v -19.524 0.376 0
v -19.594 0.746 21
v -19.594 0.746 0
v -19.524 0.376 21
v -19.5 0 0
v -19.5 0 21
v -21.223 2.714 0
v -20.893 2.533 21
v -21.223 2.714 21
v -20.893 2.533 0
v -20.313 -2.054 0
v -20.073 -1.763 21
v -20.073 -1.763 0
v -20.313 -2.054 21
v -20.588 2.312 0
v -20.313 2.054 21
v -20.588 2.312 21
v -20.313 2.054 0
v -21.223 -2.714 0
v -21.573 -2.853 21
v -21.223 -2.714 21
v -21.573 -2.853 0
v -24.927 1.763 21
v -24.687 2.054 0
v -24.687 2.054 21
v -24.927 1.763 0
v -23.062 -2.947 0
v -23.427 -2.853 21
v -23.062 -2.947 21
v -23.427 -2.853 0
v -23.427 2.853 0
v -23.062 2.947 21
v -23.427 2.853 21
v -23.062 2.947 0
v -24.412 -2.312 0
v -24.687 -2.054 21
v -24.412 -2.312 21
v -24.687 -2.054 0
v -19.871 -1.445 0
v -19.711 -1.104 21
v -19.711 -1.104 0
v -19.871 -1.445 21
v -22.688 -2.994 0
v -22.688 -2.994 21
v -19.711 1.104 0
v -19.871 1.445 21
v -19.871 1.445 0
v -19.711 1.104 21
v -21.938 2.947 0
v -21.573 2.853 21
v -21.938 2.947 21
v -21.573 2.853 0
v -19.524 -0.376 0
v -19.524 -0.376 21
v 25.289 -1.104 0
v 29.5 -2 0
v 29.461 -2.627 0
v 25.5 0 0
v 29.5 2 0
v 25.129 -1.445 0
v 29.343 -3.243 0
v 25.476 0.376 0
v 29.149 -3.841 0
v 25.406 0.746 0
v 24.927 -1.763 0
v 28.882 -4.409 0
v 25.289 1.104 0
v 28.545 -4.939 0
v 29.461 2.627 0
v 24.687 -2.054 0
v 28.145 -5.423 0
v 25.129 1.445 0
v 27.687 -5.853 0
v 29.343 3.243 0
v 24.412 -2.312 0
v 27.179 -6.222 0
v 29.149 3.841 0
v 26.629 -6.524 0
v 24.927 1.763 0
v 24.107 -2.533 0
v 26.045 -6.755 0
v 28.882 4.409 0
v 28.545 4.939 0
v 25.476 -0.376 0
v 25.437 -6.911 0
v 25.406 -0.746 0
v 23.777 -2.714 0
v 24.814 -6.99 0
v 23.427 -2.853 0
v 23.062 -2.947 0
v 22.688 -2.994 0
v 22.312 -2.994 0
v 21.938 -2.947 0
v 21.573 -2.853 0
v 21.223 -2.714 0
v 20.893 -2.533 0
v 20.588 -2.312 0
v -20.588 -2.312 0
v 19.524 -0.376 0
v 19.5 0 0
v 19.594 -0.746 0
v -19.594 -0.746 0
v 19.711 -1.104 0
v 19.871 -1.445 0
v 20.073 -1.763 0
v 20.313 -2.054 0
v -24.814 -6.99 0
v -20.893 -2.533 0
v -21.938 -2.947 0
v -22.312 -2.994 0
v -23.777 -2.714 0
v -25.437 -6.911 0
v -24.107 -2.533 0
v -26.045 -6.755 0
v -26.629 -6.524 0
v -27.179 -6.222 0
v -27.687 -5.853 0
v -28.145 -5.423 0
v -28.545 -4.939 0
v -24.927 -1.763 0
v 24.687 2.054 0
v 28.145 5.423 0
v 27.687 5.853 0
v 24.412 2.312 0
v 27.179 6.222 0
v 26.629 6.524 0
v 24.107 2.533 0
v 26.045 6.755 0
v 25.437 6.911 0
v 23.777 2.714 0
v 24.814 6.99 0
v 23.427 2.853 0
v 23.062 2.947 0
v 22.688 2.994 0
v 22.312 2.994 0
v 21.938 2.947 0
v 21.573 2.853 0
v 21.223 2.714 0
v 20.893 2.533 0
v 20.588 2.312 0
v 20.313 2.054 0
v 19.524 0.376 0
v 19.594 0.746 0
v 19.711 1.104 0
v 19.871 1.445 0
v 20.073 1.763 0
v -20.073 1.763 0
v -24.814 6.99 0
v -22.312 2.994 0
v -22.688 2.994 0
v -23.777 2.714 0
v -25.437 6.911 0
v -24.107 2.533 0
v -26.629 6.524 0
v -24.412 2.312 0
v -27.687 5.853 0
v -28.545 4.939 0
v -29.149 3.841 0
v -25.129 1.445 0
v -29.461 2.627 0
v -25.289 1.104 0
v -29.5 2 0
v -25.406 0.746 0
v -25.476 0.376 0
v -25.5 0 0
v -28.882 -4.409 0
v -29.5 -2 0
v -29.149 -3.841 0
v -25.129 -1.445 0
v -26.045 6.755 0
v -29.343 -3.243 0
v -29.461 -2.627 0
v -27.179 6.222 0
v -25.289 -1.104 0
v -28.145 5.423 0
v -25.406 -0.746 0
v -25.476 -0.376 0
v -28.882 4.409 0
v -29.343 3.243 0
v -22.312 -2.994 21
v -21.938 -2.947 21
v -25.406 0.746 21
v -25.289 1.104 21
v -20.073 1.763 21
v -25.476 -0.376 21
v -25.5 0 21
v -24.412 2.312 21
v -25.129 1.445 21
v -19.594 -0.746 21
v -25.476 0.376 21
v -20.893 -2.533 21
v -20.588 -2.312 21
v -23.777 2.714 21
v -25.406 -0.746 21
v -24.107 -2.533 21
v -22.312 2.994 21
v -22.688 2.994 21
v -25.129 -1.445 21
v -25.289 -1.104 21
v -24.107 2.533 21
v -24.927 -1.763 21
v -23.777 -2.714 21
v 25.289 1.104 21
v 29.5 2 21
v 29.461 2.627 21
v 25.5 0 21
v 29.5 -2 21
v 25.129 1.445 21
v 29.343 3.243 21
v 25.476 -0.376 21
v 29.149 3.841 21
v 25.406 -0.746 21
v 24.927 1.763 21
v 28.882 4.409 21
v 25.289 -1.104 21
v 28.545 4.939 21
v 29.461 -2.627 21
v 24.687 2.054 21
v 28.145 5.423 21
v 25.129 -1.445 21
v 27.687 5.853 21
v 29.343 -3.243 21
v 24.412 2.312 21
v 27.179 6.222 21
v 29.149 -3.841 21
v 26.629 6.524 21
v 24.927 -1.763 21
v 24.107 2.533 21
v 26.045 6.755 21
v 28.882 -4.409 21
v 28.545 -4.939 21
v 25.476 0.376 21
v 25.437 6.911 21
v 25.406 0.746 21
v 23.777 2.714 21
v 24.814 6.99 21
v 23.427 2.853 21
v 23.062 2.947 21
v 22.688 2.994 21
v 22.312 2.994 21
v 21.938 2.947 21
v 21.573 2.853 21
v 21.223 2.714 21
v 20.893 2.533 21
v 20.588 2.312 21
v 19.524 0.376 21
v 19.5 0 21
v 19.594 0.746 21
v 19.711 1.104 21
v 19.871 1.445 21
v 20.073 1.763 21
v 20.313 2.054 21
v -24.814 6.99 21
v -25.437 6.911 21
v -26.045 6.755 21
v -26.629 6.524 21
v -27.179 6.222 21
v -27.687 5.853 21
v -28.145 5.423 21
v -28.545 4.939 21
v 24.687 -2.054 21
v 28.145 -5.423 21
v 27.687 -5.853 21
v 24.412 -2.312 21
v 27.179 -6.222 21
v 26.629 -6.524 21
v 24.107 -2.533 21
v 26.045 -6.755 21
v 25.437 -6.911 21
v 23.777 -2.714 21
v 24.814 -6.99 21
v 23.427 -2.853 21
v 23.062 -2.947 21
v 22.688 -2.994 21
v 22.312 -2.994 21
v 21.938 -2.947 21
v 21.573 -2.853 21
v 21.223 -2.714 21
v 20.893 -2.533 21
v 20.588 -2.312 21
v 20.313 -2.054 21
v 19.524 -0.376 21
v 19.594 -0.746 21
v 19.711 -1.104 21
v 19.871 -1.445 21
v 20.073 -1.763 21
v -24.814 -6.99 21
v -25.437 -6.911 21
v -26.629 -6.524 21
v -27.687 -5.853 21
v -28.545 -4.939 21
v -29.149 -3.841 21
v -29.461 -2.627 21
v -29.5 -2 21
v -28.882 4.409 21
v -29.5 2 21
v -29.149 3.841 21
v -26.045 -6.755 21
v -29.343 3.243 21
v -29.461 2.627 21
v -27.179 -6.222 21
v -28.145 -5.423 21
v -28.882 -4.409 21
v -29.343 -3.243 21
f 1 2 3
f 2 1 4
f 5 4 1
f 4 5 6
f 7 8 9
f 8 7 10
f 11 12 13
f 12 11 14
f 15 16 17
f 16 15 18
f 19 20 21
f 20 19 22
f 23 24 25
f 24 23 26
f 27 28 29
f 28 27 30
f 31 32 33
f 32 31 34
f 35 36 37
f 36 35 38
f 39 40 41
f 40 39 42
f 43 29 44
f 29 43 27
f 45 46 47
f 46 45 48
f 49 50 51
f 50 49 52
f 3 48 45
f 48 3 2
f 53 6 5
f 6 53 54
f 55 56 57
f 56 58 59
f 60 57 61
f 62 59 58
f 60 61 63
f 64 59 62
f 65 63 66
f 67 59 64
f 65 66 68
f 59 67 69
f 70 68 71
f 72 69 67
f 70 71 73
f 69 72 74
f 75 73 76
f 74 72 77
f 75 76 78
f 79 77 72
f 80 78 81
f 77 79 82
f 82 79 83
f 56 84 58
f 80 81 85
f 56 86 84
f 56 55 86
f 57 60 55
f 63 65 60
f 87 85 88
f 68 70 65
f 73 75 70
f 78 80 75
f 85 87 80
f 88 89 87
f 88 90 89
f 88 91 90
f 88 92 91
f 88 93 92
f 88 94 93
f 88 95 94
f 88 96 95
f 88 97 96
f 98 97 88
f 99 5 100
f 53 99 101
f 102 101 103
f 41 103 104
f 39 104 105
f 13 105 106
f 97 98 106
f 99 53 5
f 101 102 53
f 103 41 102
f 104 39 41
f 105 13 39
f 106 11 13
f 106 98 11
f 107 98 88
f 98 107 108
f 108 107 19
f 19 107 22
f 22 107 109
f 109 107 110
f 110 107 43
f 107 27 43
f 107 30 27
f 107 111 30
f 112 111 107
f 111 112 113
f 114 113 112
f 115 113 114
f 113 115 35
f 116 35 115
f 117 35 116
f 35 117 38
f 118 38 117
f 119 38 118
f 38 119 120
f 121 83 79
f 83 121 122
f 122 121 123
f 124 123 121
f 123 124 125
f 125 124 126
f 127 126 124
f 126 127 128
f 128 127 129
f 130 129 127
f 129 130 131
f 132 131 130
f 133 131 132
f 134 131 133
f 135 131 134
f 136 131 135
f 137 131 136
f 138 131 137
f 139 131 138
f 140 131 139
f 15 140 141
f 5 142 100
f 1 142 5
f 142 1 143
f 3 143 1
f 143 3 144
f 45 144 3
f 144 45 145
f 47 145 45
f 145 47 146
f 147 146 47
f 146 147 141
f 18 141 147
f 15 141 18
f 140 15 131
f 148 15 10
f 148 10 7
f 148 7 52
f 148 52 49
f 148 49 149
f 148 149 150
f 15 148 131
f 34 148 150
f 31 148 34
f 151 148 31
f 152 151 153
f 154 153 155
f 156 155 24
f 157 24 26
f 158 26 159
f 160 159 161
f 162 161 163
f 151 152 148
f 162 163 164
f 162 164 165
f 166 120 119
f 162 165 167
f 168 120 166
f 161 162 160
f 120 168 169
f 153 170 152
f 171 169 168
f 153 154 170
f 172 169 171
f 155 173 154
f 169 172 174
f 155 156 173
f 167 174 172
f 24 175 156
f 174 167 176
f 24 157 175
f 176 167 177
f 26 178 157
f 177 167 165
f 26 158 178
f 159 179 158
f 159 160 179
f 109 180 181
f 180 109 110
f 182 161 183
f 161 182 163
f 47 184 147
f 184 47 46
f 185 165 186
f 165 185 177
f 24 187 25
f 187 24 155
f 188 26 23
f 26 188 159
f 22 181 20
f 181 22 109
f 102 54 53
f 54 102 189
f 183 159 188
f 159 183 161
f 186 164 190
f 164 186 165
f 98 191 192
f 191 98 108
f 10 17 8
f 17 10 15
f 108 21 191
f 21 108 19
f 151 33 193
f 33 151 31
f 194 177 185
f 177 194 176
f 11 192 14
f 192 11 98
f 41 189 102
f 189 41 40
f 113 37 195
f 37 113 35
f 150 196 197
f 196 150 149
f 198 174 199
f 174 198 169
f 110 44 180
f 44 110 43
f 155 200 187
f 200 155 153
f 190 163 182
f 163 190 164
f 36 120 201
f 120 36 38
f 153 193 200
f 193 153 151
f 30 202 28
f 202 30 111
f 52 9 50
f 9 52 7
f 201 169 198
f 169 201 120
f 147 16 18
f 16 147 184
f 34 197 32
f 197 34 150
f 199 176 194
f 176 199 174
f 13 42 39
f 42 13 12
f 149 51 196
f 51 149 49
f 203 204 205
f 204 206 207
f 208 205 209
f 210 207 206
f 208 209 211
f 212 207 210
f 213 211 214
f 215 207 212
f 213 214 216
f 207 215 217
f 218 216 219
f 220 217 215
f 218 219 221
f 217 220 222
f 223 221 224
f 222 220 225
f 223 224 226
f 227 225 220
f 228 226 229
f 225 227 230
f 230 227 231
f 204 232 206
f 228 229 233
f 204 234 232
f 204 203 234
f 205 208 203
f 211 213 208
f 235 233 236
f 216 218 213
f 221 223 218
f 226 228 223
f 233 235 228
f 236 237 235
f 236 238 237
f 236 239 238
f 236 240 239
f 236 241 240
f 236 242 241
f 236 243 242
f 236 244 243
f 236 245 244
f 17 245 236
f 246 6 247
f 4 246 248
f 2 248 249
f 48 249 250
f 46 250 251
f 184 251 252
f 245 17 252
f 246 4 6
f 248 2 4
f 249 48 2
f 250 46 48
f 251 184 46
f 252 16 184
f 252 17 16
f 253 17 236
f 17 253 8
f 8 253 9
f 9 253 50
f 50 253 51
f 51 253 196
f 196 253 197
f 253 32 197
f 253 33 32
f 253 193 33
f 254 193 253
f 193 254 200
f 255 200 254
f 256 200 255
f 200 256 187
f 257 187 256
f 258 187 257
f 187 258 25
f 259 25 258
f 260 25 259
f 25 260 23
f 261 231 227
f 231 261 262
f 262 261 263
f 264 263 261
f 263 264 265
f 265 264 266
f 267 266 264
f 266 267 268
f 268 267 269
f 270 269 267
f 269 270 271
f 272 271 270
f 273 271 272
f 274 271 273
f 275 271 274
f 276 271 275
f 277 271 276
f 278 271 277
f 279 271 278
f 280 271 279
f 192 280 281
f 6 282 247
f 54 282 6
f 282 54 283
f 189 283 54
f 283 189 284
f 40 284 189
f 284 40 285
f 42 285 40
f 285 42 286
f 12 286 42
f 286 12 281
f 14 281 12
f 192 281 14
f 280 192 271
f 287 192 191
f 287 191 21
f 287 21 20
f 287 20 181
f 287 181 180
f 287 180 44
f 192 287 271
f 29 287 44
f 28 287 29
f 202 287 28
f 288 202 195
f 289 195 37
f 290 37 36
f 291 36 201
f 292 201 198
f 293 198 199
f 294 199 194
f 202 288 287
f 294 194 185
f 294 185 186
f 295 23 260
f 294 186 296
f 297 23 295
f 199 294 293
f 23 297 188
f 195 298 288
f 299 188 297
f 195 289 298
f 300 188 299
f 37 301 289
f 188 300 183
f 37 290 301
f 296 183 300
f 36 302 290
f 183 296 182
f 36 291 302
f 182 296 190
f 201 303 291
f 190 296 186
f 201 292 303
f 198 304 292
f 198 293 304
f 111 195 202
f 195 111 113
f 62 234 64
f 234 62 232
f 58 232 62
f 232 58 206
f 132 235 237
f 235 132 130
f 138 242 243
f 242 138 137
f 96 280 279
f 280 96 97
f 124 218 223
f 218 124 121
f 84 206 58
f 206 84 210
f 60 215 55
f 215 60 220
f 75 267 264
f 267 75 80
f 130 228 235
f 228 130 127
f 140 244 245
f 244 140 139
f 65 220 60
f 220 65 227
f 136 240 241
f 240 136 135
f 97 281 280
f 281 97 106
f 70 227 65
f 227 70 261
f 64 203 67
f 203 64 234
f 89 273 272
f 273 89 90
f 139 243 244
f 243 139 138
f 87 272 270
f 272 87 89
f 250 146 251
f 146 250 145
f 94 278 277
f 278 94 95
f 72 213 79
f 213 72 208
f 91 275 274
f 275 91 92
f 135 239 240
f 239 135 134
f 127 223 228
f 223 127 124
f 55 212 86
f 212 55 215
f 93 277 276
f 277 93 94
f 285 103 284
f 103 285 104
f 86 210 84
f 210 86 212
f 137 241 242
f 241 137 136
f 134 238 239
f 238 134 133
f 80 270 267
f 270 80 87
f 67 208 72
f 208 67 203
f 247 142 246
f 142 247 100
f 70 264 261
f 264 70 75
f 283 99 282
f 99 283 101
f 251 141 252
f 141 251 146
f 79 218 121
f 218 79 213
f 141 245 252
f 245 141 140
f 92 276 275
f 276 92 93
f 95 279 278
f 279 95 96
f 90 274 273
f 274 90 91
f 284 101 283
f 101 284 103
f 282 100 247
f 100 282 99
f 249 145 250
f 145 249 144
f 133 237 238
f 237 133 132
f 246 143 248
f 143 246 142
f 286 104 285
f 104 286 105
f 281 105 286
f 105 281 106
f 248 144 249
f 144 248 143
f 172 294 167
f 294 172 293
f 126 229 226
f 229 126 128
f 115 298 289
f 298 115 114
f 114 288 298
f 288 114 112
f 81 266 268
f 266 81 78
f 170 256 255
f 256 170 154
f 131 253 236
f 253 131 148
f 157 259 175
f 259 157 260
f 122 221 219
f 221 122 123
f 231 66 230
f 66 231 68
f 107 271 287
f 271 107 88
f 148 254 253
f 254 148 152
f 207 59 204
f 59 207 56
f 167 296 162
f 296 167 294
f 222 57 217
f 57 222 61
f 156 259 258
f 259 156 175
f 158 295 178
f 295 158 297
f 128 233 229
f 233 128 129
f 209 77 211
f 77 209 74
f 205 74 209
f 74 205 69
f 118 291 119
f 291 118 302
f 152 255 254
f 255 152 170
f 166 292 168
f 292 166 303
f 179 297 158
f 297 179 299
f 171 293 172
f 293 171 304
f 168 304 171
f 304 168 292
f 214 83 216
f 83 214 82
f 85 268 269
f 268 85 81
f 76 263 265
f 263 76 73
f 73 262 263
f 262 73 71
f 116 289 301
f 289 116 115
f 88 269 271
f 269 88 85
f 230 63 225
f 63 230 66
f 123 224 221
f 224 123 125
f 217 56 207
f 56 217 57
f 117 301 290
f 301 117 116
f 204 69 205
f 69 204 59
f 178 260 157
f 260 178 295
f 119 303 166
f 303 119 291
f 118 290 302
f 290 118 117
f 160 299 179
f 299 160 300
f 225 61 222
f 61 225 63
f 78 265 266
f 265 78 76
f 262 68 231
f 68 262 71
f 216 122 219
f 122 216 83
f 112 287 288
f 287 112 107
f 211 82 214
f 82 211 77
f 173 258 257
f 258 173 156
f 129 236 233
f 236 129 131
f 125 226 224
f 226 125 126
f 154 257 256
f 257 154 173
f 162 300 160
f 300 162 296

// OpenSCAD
$fn = 50;


difference() {
	union() {
		hull() {
			translate(v = [-24.5000000000, 2.0000000000, 0]) {
				cylinder(h = 21, r = 5);
			}
			translate(v = [24.5000000000, 2.0000000000, 0]) {
				cylinder(h = 21, r = 5);
			}
			translate(v = [-24.5000000000, -2.0000000000, 0]) {
				cylinder(h = 21, r = 5);
			}
			translate(v = [24.5000000000, -2.0000000000, 0]) {
				cylinder(h = 21, r = 5);
			}
		}
	}
	union() {
		translate(v = [-22.5000000000, 0.0000000000, 0]) {
			cylinder(h = 21, r = 3.0000000000);
		}
		translate(v = [22.5000000000, 0.0000000000, 0]) {
			cylinder(h = 21, r = 3.0000000000);
		}
		translate(v = [-22.5000000000, 0.0000000000, 0]) {
			cylinder(h = 21, r = 1.5000000000);
		}
		translate(v = [22.5000000000, 0.0000000000, 0]) {
			cylinder(h = 21, r = 1.5000000000);
		}
		translate(v = [-22.5000000000, 0.0000000000, 0]) {
			cylinder(h = 21, r = 1.5000000000);
		}
		translate(v = [22.5000000000, 0.0000000000, 0]) {
			cylinder(h = 21, r = 1.5000000000);
		}
		translate(v = [-22.5000000000, 0.0000000000, 0]) {
			cylinder(h = 21, r = 1.5000000000);
		}
		translate(v = [22.5000000000, 0.0000000000, 0]) {
			cylinder(h = 21, r = 1.5000000000);
		}
	}
}
